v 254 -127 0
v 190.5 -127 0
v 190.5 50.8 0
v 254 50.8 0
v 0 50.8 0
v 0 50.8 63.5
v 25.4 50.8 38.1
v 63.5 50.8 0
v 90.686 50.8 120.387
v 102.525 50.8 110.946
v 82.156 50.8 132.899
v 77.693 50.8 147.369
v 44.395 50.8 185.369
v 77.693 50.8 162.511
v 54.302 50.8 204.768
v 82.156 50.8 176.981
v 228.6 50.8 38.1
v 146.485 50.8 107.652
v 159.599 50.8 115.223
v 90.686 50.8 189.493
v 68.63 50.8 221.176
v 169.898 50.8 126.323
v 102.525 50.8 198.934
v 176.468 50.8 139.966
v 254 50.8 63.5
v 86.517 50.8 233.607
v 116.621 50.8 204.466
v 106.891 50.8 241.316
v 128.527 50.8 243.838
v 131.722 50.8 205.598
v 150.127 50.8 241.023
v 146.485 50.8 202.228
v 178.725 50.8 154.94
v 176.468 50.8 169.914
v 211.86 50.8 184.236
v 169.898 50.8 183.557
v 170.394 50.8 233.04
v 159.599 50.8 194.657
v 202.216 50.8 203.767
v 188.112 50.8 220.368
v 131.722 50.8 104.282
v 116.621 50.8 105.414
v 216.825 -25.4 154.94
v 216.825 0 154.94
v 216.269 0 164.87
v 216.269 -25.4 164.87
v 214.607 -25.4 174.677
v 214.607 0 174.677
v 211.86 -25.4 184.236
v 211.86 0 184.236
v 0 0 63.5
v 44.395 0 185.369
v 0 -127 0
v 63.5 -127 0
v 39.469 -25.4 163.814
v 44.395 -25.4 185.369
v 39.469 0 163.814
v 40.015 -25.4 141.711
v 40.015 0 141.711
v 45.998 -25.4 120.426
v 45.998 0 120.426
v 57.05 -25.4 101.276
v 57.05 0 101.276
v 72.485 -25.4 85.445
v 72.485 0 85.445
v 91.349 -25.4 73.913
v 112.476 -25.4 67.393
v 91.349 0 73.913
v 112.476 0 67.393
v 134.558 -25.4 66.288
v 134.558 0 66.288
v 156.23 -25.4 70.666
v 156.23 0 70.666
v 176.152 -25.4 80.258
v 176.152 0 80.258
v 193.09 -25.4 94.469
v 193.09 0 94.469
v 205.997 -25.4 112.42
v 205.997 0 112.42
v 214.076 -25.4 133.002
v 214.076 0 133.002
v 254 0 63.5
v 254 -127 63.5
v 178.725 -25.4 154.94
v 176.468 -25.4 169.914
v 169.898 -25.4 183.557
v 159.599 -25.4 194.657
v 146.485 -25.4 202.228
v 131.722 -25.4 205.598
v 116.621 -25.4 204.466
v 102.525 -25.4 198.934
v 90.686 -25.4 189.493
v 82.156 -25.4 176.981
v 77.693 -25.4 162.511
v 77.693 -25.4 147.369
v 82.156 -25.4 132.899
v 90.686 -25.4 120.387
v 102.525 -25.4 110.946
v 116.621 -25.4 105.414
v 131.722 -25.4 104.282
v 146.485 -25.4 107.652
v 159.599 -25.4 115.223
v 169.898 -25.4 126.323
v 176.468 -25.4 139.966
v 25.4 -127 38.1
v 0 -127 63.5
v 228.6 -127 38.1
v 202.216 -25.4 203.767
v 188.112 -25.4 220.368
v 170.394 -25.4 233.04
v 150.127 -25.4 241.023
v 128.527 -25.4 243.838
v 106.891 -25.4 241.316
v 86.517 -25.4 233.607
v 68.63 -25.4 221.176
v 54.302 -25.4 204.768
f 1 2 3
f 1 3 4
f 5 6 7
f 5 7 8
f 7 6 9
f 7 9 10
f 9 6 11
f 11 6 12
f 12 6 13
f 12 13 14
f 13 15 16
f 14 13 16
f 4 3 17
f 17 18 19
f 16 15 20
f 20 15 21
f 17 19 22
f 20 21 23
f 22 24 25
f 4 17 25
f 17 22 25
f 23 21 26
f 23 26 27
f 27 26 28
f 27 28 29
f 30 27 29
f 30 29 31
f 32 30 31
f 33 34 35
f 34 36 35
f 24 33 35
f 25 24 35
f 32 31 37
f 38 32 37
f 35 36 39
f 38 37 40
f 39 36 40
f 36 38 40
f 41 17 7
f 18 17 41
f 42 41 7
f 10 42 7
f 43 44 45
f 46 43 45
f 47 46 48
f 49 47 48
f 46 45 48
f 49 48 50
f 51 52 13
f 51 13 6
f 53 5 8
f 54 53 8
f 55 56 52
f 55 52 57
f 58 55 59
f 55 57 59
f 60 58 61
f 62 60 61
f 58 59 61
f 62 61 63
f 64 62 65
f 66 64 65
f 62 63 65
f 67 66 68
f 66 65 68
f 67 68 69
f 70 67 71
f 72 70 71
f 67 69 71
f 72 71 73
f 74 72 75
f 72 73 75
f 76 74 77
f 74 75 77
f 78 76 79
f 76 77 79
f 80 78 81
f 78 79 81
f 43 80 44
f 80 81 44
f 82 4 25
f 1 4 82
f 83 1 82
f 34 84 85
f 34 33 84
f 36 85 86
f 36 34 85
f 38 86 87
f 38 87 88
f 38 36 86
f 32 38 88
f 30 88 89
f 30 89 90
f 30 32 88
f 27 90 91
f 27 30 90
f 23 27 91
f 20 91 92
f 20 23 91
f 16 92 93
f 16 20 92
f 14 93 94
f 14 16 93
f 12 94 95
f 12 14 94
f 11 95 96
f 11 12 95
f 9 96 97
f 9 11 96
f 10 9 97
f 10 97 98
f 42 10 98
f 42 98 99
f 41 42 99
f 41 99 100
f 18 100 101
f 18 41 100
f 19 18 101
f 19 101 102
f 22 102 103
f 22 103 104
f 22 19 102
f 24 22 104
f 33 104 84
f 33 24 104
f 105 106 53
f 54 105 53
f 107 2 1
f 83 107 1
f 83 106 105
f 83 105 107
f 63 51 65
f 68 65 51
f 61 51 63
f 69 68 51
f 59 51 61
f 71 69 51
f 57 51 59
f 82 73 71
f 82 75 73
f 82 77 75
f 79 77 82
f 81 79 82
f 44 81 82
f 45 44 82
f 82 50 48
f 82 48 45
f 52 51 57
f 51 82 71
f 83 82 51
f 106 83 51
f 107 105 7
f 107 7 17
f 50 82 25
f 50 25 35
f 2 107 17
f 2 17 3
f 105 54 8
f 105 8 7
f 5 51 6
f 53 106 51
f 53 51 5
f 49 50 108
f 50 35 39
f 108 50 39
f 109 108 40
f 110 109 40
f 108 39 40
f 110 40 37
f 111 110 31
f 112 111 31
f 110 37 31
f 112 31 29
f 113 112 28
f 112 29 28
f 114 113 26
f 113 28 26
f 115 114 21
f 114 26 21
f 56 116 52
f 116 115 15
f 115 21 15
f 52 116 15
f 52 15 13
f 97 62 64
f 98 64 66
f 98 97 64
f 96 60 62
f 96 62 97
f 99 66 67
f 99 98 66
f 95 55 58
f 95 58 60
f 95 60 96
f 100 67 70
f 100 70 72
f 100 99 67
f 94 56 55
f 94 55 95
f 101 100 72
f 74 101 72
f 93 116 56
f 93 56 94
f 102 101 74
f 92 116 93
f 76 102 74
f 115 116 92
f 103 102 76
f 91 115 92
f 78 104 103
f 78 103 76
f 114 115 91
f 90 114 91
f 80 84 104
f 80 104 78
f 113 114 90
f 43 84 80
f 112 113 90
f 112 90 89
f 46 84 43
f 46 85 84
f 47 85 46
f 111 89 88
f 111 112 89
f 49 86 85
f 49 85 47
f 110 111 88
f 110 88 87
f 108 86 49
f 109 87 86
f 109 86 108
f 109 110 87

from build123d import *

# Parameters (mm, degrees)
F1_DEPTH = 127
F0_R     = 50.8
F2_DEPTH = 50.8
F3_DEPTH = 25.4


with BuildPart() as f1:
    # F0 (on Front) → F1 (new body)
    with BuildSketch(Plane.XZ):
        Polygon((0, 63.5), (0, 0), (63.5, 0), (25.4, 38.1), (63.5, 38.1), (190.5, 38.1), (228.6, 38.1), (190.5, 0), (254, 0), (254, 63.5), align=None)
    extrude(amount=F1_DEPTH)

    # F0 (on Front) → F2 (join)
    with BuildSketch(Plane.XZ):
        with BuildLine():
            Line((44.395084, 185.368859), (0, 63.5))
            Line((0, 63.5), (254, 63.5))
            Line((254, 63.5), (211.859648, 184.235612))
            ThreePointArc((211.859648, 184.235612), (215.575085, 169.796736), (216.825286, 154.94))
            ThreePointArc((216.825286, 154.94), (112.47577, 67.392742), (44.395084, 185.368859))
        make_face()
        with BuildLine():
            ThreePointArc((211.859648, 184.235612), (128.526866, 243.837965), (44.395084, 185.368859))
            ThreePointArc((44.395084, 185.368859), (112.47577, 67.392742), (216.825286, 154.94))
            ThreePointArc((216.825286, 154.94), (215.575085, 169.796736), (211.859648, 184.235612))
        make_face()
        with Locations((127.925286, 154.94)):
            Circle(F0_R, mode=Mode.SUBTRACT)
        Polygon((0, 63.5), (0, 0), (63.5, 0), (25.4, 38.1), (63.5, 38.1), (190.5, 38.1), (228.6, 38.1), (190.5, 0), (254, 0), (254, 63.5), align=None)
    extrude(amount=-F2_DEPTH)

    # F0 (on Front) → F3 (join)
    with BuildSketch(Plane.XZ):
        with BuildLine():
            ThreePointArc((211.859648, 184.235612), (128.526866, 243.837965), (44.395084, 185.368859))
            ThreePointArc((44.395084, 185.368859), (112.47577, 67.392742), (216.825286, 154.94))
            ThreePointArc((216.825286, 154.94), (215.575085, 169.796736), (211.859648, 184.235612))
        make_face()
        with Locations((127.925286, 154.94)):
            Circle(F0_R, mode=Mode.SUBTRACT)
    extrude(amount=F3_DEPTH)


solid = f1.part
